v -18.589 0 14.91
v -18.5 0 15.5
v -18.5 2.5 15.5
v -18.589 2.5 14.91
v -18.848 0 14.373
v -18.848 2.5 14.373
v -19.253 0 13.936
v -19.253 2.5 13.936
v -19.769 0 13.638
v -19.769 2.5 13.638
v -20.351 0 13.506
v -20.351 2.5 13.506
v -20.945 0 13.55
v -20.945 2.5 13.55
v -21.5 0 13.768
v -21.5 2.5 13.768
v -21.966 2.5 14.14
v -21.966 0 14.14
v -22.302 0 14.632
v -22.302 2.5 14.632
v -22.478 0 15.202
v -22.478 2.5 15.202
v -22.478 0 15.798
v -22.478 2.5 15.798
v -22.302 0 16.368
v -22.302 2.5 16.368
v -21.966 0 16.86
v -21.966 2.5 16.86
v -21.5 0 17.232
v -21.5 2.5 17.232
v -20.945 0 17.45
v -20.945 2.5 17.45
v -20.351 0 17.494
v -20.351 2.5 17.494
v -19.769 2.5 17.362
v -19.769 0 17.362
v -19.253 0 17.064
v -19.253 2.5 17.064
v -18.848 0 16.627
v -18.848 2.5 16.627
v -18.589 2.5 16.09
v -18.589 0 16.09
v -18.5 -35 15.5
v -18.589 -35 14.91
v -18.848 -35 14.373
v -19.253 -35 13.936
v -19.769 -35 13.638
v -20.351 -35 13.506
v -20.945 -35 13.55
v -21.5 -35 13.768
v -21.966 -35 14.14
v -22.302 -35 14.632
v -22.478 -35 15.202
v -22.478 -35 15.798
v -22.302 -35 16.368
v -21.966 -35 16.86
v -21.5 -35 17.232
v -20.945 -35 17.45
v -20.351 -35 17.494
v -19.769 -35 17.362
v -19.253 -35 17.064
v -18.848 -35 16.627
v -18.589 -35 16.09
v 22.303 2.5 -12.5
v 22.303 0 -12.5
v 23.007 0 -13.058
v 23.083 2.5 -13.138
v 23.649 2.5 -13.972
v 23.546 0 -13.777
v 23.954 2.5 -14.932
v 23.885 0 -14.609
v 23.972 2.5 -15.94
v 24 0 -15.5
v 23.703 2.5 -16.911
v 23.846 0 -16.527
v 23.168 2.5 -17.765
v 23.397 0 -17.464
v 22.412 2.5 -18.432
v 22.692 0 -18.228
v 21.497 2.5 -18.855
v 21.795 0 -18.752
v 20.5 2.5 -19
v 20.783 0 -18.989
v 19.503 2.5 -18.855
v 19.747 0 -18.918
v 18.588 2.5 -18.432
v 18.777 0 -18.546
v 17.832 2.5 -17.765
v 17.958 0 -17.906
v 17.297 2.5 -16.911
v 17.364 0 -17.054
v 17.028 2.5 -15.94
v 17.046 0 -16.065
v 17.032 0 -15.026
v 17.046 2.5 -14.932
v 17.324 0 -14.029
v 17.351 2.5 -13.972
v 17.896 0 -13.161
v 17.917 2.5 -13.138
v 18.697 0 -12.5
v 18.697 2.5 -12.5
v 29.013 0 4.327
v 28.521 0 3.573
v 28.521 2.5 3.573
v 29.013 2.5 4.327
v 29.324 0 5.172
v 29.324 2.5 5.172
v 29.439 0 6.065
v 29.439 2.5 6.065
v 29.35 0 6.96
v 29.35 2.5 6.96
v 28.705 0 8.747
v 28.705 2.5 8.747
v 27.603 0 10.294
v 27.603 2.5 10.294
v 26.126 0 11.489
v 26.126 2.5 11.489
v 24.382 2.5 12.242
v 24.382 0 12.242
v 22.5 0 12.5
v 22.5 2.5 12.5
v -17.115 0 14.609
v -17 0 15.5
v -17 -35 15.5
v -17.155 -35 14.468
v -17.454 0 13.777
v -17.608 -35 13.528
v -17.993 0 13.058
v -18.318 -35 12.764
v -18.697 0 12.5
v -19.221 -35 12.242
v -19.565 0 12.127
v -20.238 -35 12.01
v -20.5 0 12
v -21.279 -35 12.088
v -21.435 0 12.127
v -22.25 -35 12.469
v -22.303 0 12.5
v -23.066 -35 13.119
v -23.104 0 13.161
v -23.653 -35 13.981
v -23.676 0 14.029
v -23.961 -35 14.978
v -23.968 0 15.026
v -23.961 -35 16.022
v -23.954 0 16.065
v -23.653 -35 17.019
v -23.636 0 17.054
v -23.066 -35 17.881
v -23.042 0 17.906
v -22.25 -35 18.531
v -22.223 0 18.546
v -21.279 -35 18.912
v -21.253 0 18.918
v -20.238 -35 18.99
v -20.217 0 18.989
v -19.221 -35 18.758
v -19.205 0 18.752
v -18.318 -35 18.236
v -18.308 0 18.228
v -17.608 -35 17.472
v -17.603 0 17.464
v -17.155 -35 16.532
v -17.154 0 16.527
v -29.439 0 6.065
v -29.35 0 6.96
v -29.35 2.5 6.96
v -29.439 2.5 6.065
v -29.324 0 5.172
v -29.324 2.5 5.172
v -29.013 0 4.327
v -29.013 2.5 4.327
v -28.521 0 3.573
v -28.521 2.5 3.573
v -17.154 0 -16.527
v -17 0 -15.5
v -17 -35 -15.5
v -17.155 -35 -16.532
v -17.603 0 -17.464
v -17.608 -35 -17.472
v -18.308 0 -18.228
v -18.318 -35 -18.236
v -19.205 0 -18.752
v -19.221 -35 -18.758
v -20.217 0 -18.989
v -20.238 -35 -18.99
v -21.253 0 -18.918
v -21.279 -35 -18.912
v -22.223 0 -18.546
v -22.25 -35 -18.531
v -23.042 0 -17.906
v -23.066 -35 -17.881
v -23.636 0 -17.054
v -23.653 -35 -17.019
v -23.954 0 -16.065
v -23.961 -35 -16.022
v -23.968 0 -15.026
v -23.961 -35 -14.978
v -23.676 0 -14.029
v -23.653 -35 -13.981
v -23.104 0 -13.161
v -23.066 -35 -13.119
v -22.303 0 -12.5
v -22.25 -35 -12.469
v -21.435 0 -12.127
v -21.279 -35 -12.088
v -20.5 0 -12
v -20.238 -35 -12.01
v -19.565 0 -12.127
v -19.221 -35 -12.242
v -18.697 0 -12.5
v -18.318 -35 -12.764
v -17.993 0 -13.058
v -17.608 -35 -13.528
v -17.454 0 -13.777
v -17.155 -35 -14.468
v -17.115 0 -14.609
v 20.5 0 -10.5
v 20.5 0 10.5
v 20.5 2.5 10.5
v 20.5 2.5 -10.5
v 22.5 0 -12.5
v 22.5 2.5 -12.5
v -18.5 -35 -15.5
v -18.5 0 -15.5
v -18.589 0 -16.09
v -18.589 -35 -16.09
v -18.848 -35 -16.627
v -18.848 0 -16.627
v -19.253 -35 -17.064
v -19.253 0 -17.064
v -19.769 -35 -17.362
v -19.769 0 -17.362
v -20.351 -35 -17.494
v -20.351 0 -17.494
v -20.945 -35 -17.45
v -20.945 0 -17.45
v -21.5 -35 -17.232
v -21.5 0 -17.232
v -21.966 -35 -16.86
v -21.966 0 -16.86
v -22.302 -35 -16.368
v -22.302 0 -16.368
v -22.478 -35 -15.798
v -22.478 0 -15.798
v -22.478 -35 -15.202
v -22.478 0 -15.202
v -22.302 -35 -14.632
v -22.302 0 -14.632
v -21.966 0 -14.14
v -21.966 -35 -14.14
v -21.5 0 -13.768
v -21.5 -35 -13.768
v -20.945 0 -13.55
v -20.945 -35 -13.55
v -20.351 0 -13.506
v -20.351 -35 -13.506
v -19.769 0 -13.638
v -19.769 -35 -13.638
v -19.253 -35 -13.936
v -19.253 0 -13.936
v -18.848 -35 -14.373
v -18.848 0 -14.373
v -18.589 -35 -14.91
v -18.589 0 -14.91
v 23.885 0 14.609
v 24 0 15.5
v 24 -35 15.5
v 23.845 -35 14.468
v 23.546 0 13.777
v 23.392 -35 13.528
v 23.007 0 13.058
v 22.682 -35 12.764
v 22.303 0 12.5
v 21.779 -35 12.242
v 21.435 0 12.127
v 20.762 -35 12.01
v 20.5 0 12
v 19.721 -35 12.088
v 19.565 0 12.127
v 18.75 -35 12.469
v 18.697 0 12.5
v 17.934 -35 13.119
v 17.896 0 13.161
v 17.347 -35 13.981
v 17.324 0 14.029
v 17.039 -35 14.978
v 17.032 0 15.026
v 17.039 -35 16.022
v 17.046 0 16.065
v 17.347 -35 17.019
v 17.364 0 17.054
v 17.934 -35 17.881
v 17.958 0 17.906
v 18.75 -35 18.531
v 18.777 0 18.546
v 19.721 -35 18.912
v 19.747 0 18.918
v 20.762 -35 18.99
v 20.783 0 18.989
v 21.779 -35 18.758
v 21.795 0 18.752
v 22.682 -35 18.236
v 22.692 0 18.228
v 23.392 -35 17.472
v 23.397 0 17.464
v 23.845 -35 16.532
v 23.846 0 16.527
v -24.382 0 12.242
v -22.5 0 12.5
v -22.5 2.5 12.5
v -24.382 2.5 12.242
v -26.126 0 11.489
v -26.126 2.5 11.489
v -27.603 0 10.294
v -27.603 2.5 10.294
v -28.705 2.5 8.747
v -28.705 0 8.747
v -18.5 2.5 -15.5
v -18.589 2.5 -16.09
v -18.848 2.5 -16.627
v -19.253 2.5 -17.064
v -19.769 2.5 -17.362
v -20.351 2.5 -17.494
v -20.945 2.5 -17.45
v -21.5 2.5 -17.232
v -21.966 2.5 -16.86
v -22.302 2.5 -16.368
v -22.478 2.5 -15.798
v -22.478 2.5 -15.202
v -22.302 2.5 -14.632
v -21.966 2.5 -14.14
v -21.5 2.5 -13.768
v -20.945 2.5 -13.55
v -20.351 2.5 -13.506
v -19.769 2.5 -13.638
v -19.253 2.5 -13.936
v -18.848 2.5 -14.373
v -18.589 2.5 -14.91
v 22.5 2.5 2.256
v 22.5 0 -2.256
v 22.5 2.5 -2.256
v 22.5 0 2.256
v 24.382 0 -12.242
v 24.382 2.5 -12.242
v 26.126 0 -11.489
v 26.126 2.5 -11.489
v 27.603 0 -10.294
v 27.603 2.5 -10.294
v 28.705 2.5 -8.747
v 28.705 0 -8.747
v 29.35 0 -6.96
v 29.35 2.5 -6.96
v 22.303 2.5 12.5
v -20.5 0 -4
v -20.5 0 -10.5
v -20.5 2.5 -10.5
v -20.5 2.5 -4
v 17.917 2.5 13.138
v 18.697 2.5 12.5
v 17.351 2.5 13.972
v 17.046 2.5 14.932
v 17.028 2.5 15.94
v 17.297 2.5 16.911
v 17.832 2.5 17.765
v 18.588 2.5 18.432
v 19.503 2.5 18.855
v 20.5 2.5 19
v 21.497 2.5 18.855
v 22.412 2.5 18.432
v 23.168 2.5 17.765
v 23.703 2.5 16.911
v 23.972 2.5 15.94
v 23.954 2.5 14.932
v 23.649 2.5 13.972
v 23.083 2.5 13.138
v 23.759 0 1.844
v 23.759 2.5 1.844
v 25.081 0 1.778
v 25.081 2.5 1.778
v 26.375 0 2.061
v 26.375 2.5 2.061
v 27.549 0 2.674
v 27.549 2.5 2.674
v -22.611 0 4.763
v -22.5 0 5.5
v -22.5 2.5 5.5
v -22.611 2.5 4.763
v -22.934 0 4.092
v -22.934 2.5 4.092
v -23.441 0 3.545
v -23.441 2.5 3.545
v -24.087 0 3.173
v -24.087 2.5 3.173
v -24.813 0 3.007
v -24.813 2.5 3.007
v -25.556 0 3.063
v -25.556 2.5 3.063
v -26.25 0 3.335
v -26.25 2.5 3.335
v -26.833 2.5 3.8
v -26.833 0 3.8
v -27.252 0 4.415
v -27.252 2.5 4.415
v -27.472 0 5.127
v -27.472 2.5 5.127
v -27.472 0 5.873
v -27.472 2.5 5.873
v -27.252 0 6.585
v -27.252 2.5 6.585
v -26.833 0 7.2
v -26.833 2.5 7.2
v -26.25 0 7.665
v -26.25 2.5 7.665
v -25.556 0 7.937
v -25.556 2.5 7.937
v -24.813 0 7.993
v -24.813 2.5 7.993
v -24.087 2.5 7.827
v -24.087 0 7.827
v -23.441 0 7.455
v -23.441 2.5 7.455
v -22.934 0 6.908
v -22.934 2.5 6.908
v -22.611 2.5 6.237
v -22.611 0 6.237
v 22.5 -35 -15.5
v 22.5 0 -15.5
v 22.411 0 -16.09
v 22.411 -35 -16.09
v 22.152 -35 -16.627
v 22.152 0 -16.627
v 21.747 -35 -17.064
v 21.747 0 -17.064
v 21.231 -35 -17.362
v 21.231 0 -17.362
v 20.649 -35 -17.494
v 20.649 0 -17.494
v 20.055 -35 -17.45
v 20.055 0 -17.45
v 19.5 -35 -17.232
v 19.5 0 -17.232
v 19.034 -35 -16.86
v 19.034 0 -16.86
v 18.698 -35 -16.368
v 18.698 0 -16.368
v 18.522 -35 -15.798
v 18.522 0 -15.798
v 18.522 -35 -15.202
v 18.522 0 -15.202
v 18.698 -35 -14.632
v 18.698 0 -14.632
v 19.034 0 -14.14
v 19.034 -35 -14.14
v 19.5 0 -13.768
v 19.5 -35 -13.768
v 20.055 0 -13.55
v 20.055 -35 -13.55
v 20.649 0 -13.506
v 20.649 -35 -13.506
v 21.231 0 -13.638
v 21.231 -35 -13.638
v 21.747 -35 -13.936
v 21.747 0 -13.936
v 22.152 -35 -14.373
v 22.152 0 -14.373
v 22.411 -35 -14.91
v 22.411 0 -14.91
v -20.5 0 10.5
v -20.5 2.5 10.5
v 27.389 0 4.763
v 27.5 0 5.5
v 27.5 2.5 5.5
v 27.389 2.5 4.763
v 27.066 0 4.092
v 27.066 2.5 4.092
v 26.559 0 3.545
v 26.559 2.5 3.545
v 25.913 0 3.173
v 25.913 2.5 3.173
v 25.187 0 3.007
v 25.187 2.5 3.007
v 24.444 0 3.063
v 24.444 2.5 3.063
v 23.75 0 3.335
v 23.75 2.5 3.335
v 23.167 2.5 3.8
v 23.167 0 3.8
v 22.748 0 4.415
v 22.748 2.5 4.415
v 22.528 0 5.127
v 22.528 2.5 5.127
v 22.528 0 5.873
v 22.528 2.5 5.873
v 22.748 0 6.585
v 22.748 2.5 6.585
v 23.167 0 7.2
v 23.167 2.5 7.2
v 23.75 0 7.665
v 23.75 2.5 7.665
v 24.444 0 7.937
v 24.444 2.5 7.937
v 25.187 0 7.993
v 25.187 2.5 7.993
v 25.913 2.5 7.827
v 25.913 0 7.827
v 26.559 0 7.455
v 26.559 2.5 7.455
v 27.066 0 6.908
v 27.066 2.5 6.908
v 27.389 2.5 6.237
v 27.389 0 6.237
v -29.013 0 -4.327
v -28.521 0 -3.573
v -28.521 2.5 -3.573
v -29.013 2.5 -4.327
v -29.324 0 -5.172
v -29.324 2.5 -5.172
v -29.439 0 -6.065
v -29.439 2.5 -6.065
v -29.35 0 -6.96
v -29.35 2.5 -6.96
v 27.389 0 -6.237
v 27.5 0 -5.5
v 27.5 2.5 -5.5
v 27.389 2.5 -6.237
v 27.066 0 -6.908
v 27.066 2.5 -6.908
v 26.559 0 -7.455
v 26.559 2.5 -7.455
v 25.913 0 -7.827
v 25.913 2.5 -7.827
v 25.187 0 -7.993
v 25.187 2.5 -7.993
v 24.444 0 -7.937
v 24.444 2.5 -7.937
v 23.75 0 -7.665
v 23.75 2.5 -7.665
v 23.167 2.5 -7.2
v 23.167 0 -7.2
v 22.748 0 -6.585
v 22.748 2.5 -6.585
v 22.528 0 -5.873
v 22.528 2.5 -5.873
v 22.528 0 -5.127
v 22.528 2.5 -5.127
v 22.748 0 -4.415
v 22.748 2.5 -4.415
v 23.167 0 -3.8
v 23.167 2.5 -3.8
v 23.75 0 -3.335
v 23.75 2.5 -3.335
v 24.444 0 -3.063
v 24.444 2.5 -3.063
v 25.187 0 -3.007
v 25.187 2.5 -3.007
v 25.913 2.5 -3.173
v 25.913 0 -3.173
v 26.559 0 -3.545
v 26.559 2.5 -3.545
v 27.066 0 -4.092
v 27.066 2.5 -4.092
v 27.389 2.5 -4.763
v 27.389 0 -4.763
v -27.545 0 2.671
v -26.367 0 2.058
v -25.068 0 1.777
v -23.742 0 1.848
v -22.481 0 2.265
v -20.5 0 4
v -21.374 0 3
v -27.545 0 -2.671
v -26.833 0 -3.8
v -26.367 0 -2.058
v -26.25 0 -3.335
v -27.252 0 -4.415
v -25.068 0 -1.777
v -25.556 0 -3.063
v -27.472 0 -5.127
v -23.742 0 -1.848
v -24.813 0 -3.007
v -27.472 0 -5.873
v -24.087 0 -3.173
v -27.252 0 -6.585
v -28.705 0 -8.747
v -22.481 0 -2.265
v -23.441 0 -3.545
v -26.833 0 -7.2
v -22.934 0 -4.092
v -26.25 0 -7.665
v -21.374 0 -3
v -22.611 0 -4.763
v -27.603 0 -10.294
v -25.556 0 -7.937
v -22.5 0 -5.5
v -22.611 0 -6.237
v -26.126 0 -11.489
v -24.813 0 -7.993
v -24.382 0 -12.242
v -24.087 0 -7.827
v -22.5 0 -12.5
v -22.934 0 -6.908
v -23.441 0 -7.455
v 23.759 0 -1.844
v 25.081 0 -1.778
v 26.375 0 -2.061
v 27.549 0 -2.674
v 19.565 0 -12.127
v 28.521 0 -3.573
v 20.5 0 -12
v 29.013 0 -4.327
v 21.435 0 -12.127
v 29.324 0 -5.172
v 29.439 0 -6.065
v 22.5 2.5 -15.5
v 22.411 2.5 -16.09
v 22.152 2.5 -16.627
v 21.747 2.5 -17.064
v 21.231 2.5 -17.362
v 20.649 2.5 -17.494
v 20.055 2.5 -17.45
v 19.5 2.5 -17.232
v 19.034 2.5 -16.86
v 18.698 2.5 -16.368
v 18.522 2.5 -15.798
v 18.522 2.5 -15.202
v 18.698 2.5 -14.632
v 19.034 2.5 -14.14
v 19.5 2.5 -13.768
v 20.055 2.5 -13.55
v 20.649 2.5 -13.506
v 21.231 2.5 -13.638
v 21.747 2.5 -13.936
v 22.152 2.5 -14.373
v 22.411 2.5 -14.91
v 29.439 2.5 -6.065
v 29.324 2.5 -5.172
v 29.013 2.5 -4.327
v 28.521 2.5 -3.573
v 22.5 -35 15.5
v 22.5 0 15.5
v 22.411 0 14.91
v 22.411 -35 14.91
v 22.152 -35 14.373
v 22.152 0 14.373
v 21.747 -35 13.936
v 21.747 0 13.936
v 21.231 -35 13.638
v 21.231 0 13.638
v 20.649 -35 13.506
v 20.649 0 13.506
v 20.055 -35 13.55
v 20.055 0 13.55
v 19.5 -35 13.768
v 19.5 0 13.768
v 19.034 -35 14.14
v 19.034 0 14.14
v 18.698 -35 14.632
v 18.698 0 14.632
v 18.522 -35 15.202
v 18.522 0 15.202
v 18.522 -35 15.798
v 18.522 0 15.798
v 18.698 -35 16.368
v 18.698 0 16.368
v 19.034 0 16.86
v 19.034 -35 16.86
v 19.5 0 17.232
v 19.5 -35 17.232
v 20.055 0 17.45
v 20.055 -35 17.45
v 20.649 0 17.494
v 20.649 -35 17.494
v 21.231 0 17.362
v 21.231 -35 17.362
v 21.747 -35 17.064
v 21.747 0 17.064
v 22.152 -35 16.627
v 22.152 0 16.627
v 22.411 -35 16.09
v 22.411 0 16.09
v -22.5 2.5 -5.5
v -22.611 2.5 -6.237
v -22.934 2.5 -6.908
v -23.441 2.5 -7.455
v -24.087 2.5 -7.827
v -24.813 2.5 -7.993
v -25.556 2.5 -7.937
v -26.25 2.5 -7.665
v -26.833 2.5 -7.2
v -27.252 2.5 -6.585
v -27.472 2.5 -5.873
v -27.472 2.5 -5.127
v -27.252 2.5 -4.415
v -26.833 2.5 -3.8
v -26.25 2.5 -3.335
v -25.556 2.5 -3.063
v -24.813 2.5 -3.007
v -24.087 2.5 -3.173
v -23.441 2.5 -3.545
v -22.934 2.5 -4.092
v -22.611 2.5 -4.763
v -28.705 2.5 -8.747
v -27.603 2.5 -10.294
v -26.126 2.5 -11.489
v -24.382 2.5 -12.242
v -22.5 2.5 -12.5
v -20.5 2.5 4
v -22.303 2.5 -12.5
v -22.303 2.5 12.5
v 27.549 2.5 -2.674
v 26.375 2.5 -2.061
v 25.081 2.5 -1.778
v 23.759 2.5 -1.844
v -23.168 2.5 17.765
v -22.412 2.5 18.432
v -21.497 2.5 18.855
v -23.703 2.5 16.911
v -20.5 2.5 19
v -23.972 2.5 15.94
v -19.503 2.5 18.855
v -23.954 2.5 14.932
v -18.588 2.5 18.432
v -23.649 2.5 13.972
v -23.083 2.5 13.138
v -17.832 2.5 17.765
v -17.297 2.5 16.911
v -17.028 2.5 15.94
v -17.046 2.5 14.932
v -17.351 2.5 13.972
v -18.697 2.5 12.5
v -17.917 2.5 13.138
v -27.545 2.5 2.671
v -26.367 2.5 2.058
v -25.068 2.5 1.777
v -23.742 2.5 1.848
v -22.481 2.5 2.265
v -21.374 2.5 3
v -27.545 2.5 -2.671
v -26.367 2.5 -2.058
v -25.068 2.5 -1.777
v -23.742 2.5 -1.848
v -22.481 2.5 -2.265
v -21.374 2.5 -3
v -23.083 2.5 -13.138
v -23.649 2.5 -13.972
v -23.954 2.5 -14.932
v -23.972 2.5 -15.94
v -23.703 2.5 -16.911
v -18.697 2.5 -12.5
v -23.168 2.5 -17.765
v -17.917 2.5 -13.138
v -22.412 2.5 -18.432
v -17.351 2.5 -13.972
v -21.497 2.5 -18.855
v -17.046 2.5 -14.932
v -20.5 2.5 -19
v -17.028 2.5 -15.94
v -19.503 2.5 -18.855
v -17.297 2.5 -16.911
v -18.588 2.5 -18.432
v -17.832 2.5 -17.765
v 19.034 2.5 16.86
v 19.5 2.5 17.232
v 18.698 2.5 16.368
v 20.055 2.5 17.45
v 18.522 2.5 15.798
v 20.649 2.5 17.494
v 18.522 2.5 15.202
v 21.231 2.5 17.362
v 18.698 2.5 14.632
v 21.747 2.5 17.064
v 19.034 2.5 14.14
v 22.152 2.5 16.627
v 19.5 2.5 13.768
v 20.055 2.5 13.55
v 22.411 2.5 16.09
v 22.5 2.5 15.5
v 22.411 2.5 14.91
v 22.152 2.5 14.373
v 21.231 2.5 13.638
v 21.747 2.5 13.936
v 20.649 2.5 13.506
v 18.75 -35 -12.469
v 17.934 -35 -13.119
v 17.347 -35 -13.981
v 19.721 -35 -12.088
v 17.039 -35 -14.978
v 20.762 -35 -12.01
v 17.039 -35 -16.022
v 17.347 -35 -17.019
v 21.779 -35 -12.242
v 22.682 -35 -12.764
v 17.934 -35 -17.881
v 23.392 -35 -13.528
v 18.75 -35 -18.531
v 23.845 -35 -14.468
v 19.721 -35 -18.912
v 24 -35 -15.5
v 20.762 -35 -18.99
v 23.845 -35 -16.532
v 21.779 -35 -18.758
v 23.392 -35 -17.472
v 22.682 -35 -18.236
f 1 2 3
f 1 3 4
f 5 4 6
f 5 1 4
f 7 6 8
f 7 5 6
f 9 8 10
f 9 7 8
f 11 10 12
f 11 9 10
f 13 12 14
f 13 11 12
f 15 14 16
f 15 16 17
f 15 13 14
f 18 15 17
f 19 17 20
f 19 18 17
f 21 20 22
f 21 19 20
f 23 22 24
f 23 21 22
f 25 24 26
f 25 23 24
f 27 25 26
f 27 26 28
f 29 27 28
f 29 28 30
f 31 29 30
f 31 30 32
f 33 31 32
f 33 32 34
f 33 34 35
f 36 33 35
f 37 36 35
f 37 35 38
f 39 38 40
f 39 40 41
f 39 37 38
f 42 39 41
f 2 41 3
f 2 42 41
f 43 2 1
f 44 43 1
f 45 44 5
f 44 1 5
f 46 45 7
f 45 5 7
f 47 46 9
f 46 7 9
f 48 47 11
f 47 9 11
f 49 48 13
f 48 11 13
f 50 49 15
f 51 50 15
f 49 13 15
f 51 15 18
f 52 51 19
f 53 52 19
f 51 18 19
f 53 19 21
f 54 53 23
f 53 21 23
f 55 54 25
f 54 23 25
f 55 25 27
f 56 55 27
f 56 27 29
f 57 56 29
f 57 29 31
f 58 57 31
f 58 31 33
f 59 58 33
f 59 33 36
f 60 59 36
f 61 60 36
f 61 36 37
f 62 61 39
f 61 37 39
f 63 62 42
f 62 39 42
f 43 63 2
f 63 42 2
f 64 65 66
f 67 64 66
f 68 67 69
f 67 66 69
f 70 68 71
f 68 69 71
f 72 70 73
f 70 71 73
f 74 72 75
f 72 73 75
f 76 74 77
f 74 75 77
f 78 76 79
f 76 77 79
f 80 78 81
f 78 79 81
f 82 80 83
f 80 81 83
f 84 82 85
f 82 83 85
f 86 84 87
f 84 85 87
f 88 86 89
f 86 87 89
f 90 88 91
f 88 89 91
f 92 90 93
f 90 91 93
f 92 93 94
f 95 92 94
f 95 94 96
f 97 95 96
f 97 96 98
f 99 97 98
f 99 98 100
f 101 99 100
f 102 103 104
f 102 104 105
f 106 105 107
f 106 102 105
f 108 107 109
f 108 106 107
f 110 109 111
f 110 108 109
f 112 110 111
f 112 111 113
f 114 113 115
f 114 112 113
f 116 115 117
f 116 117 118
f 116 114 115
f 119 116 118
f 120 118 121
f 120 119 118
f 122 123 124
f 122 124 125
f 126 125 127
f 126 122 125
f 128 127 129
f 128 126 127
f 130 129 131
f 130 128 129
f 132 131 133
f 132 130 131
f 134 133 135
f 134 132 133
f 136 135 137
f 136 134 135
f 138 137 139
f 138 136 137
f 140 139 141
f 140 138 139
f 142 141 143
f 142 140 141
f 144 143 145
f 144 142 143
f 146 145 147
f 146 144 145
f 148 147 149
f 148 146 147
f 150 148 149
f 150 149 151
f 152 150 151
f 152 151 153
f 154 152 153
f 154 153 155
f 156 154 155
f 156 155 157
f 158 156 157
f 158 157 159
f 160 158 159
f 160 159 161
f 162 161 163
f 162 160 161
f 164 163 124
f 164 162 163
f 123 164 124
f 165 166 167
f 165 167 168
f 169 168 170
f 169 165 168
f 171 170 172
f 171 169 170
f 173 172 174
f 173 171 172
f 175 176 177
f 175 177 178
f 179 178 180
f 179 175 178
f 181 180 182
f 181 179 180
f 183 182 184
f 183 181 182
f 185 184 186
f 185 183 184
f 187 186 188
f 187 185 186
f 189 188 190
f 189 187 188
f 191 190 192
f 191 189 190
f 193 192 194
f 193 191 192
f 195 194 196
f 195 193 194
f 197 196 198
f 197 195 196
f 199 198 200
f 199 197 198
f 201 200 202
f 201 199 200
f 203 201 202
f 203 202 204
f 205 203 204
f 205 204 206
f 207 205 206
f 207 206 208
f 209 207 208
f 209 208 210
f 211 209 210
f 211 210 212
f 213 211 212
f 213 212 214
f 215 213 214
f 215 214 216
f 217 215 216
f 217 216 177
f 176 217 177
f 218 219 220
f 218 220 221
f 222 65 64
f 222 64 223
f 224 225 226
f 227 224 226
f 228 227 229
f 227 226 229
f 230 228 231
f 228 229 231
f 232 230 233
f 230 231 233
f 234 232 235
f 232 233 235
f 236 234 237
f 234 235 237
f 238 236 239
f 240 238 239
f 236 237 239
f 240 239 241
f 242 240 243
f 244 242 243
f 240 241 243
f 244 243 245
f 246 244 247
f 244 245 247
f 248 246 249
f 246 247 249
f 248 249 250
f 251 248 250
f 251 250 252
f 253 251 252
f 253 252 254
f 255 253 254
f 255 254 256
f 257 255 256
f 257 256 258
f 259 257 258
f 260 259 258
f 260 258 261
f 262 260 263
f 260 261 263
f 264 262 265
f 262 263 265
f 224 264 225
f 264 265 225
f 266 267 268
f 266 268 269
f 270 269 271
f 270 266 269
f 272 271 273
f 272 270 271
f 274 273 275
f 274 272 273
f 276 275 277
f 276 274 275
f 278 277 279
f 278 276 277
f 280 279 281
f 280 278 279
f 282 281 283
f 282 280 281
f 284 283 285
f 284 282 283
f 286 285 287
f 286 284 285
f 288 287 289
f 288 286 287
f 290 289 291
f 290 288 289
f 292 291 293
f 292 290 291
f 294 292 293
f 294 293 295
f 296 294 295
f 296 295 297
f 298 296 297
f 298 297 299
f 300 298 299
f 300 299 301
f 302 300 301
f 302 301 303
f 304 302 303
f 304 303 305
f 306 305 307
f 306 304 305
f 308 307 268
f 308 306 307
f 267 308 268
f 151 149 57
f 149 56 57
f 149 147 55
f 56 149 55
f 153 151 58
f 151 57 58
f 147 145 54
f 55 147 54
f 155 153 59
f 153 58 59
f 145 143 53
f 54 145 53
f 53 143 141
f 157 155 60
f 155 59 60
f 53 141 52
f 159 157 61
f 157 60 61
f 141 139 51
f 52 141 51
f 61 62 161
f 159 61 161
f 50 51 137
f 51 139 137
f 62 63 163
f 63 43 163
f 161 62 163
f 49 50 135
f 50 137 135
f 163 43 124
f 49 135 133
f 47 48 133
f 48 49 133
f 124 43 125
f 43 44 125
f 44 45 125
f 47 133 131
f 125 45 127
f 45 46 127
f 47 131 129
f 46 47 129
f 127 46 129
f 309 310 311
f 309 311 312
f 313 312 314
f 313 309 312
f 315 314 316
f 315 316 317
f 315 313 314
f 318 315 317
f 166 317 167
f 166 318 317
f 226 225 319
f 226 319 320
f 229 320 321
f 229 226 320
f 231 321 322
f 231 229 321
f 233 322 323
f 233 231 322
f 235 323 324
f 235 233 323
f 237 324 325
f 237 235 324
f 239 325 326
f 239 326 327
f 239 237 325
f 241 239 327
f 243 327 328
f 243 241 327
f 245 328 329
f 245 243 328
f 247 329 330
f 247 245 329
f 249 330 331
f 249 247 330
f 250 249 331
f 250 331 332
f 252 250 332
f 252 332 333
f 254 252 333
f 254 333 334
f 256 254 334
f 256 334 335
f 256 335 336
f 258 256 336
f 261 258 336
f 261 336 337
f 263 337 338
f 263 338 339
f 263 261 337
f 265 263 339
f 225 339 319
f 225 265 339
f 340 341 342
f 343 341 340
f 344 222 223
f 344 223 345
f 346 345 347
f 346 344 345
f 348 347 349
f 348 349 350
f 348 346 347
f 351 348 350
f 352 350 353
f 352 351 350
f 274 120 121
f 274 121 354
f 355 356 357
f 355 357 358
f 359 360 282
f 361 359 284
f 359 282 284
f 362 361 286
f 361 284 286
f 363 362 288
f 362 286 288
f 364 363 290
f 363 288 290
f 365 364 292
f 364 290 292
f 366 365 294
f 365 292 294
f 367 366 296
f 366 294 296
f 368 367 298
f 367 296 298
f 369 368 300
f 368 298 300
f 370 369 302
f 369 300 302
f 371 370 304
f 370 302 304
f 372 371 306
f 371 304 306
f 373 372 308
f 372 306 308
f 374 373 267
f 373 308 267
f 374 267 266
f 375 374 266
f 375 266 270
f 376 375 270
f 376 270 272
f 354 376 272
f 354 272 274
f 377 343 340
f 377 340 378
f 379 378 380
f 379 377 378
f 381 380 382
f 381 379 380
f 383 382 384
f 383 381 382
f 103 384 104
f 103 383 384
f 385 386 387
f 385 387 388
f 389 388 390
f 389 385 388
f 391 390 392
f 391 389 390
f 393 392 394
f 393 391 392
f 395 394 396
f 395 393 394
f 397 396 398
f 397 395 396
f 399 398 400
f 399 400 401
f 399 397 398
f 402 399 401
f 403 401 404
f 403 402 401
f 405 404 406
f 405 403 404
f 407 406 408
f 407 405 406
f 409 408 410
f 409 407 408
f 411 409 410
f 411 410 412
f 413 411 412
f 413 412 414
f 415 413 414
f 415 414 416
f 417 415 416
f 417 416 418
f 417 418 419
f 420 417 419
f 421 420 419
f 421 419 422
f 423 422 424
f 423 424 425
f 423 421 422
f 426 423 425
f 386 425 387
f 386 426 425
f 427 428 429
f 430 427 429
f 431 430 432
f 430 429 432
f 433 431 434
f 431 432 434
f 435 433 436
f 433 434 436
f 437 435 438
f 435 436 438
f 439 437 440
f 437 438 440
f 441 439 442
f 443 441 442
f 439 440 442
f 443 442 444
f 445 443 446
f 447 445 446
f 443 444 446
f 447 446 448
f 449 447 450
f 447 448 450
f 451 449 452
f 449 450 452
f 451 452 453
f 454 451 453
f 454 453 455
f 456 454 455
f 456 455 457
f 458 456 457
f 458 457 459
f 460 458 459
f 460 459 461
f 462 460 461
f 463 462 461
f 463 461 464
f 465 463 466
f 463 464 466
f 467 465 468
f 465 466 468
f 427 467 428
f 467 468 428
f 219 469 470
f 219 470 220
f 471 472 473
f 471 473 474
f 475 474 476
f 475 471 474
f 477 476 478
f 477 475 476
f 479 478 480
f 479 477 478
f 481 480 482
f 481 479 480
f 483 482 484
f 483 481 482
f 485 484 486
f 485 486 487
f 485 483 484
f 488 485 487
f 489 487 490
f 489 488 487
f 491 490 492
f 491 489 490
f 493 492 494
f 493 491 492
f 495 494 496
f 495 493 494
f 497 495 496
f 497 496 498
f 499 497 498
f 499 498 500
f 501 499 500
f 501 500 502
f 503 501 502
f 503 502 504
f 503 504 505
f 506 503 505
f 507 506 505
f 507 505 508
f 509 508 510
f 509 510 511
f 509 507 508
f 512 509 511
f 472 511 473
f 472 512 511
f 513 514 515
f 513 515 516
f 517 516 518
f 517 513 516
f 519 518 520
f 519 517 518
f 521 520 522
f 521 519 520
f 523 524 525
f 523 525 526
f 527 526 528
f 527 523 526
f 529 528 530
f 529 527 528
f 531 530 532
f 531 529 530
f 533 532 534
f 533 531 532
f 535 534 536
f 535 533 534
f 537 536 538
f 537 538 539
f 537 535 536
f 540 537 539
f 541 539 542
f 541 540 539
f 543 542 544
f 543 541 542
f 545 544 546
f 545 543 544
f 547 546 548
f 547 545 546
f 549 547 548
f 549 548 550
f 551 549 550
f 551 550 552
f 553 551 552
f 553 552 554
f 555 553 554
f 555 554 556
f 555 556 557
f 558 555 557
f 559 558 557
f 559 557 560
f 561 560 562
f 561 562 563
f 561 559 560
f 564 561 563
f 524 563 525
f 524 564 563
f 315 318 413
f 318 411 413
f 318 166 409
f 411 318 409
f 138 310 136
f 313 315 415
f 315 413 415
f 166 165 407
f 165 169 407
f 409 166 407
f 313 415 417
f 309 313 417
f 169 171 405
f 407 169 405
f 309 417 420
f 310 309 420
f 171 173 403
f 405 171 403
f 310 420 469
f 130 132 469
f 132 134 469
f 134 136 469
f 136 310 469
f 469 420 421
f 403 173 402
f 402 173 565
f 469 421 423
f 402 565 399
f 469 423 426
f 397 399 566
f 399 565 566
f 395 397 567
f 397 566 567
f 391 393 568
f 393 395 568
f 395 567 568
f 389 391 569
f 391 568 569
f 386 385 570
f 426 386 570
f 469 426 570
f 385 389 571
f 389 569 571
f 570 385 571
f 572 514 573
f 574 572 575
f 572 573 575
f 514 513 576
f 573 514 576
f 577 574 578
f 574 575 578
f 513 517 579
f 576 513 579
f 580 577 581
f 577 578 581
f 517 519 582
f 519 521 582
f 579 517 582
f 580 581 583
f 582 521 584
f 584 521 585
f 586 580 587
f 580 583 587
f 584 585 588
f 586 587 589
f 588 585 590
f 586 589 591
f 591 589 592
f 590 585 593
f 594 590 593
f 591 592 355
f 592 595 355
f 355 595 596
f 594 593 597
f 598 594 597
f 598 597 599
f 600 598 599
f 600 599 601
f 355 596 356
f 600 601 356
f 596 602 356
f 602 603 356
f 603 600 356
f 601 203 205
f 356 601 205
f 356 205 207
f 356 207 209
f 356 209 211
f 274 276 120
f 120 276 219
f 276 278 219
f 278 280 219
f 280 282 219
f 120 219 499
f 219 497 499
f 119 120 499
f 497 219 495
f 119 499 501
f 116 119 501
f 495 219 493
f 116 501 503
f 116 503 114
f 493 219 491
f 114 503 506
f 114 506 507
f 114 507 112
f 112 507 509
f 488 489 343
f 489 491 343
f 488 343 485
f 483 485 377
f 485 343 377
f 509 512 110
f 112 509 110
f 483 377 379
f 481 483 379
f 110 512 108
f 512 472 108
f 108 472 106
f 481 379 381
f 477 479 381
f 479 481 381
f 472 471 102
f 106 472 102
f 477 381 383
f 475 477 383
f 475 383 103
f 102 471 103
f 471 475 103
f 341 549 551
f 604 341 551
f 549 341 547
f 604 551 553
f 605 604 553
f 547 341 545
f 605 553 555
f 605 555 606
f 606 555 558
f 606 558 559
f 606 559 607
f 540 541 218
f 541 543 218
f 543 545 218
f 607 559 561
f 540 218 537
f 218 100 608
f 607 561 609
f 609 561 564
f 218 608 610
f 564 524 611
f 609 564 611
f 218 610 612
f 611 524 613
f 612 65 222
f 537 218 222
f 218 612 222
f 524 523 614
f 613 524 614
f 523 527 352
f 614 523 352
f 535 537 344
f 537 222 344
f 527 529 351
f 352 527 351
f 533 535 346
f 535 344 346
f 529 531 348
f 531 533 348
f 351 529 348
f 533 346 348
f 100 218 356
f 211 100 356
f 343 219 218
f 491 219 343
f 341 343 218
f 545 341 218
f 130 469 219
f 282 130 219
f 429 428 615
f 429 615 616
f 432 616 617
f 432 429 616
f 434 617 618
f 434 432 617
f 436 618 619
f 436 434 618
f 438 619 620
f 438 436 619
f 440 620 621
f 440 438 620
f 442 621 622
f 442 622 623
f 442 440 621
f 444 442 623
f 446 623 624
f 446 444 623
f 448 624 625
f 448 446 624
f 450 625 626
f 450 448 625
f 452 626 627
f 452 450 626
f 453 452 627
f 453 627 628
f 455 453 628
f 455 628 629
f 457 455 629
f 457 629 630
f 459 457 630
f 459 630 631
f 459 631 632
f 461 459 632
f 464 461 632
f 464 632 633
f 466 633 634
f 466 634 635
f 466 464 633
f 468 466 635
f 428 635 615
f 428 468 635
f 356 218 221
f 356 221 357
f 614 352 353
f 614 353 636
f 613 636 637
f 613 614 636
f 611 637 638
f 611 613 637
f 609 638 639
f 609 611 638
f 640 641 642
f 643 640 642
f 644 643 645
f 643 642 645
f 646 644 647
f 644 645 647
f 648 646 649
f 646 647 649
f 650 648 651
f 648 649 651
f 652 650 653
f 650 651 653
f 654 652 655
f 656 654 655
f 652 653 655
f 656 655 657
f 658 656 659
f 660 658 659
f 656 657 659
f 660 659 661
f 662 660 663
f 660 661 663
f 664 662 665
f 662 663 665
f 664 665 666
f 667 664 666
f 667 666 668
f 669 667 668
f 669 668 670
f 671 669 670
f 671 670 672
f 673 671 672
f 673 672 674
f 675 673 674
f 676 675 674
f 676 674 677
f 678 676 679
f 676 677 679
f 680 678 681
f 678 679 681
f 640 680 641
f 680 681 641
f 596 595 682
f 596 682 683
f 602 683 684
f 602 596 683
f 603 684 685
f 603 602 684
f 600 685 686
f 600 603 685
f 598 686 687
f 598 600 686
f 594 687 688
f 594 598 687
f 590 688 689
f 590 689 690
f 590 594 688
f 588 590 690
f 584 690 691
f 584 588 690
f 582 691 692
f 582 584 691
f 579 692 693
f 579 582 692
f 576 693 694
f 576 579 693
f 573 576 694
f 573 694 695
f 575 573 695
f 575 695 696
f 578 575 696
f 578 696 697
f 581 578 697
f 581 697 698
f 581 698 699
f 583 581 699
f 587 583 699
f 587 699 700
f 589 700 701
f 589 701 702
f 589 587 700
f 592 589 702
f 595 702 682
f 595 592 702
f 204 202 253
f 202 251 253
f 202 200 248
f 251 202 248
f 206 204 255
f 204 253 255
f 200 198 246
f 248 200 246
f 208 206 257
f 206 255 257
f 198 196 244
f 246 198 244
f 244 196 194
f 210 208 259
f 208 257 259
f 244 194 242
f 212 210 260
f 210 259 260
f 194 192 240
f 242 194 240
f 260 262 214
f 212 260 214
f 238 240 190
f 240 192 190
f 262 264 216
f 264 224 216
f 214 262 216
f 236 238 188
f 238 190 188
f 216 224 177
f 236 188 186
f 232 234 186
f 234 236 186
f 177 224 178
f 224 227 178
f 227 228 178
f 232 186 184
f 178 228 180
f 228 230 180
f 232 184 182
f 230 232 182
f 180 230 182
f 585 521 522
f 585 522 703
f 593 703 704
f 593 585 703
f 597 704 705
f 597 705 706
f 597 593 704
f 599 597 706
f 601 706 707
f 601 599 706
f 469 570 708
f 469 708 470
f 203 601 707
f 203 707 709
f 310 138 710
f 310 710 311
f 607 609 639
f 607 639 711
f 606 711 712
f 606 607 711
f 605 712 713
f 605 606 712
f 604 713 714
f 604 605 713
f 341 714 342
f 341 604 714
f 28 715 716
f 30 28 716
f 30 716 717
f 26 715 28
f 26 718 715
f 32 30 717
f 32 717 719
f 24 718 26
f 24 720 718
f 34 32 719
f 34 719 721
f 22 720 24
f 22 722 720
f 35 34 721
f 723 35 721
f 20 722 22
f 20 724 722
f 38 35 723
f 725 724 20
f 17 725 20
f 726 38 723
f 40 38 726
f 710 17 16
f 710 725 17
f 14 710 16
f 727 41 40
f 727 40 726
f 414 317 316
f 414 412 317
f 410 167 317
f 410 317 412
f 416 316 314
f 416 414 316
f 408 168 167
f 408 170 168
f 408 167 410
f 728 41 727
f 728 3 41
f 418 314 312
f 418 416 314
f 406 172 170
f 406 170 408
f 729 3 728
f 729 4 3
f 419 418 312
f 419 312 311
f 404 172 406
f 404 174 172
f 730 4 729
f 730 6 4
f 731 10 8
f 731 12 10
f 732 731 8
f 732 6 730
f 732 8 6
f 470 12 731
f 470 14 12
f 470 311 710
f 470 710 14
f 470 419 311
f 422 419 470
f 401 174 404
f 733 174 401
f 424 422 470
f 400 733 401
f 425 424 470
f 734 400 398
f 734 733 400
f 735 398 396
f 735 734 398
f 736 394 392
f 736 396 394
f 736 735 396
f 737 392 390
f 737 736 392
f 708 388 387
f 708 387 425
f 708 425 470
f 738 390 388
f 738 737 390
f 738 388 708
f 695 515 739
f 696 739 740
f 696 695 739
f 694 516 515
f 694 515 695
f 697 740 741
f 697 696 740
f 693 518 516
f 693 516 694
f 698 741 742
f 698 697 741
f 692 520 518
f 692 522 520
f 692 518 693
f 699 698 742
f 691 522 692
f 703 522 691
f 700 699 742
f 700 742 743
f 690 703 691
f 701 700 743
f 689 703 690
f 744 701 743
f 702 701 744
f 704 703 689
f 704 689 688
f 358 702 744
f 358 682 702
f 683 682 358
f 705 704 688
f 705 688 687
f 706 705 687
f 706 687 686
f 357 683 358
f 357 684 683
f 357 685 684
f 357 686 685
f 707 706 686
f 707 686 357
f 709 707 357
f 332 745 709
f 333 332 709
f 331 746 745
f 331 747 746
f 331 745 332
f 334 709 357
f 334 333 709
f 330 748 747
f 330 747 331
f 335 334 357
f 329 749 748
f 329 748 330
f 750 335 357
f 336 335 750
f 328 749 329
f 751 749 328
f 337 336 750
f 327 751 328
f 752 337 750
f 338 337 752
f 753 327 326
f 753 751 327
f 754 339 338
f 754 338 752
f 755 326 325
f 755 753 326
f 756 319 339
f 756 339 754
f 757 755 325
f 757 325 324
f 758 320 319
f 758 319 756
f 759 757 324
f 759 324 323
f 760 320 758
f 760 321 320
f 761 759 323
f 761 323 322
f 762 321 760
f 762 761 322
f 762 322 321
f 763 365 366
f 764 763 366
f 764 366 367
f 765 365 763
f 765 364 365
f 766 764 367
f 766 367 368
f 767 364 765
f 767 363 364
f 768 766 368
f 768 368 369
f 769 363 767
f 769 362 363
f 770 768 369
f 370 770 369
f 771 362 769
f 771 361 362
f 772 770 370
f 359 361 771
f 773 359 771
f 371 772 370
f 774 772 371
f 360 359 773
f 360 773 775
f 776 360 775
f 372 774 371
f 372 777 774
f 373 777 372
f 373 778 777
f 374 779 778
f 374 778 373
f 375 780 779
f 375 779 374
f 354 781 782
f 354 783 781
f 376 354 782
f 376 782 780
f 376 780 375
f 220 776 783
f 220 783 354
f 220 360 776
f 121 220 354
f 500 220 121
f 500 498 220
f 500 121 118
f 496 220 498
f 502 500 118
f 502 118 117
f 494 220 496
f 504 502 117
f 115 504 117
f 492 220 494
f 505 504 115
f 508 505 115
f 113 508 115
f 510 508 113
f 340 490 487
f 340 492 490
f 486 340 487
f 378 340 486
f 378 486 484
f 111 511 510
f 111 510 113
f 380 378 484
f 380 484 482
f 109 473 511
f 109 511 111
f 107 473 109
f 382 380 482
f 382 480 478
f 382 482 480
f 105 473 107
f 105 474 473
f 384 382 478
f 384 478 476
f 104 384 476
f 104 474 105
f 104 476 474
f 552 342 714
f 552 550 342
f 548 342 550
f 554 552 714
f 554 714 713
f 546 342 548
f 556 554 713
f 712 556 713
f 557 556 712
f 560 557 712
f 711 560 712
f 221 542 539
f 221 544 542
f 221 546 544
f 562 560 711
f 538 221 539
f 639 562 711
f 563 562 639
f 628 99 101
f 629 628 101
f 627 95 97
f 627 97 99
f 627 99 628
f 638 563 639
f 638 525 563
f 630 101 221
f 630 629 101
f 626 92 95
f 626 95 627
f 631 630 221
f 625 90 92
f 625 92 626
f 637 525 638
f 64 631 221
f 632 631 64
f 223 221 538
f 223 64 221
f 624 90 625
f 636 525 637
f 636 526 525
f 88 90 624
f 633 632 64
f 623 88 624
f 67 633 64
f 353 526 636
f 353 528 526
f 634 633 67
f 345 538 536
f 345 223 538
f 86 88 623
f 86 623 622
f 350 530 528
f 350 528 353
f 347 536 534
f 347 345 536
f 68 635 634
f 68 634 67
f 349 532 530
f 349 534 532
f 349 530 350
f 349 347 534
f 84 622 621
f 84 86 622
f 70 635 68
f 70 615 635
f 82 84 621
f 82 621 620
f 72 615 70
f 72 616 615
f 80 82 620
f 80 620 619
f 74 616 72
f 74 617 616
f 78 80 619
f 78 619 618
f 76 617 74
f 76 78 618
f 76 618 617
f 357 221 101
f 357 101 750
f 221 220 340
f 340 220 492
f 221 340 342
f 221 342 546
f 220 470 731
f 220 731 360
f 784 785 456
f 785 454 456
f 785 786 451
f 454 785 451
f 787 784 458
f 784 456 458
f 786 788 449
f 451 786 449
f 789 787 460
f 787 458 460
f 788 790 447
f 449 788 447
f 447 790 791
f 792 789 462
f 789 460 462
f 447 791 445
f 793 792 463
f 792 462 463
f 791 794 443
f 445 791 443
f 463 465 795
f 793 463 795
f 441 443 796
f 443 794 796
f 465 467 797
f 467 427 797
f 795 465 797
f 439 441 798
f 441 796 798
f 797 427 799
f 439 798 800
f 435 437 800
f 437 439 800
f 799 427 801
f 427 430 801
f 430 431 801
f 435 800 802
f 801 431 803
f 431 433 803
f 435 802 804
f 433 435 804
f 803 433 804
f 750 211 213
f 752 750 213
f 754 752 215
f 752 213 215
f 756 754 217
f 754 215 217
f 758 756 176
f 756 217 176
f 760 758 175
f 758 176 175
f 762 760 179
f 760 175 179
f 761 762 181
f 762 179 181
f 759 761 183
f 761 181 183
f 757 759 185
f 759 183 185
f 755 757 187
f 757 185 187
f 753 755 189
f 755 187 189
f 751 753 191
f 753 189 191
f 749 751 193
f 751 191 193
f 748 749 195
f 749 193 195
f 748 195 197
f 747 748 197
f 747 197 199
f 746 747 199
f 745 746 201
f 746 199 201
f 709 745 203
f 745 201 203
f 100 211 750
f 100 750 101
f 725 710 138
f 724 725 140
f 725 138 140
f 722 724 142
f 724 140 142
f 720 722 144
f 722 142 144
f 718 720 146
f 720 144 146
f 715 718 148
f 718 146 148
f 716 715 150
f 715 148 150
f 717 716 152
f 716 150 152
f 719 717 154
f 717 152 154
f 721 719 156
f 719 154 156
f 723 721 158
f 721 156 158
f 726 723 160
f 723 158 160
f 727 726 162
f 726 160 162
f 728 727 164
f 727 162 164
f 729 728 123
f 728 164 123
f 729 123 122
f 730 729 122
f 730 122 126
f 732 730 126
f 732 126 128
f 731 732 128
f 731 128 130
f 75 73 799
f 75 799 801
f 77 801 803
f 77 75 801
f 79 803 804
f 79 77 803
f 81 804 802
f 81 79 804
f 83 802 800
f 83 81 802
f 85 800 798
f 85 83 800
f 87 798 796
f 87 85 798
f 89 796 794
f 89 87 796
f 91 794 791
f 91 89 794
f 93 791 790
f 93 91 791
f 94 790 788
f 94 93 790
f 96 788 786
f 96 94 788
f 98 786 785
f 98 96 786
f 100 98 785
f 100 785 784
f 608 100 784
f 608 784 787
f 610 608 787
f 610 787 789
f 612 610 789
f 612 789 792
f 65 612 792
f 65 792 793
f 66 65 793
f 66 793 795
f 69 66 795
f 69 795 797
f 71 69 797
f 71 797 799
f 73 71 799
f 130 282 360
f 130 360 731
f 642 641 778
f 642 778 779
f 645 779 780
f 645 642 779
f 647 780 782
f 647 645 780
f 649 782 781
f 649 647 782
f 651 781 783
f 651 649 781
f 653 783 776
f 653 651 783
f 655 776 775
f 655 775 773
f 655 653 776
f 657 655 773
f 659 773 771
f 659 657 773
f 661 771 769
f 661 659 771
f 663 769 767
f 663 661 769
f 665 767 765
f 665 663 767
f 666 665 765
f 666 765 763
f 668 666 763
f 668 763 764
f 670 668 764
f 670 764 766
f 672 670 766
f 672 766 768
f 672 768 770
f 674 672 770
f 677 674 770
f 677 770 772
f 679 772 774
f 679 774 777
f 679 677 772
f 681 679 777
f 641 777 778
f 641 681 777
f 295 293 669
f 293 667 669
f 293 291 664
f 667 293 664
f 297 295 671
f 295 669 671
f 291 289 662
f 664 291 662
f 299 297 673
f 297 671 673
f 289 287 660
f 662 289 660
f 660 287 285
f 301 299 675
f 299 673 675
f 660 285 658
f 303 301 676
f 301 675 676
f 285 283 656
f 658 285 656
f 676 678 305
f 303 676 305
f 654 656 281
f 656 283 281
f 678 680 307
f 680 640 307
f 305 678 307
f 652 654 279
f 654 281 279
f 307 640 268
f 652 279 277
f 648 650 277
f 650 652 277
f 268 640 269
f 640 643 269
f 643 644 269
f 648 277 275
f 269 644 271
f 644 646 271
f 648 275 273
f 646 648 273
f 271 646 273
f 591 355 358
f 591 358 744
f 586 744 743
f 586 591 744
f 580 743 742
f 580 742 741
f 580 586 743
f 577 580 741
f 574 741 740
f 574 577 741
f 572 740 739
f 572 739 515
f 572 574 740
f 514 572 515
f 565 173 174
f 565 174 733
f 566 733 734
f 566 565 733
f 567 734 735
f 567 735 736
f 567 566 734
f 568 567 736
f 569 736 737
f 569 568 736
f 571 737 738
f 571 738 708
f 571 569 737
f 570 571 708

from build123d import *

# Parameters (mm, degrees)
SKETCH1_R                = 2.5
BOSS_EXTRUDE1_DEPTH      = 2.5
SKETCH4_R                = 3.5
SKETCH4_R_2              = 2
BOSS_EXTRUDE2_DEPTH      = 2.5
BOSS_EXTRUDE2_DEPTH_BACK = 35


with BuildPart() as part:
    # Sketch1 → Boss-Extrude1 (new body)
    with BuildSketch(Plane(origin=(0, 0, 0), x_dir=(1, 0, 0), z_dir=(0, 1, 0))):
        with BuildLine():
            Line((20.5, 10.5), (-20.5, 10.5))
            Line((-20.5, 10.5), (-20.5, 4))
            ThreePointArc((-20.5, 4), (-24.40287122, 1.76806345), (-28.520566145, 3.573204173))
            ThreePointArc((-28.520566145, 3.573204173), (-29.324072849, 5.171652721), (-29.350396575, 6.960498116))
            ThreePointArc((-29.350396575, 6.960498116), (-26.904940816, 10.941842627), (-22.5, 12.5))
            Line((-22.5, 12.5), (22.5, 12.5))
            ThreePointArc((22.5, 12.5), (26.904940816, 10.941842627), (29.350396575, 6.960498116))
            ThreePointArc((29.350396575, 6.960498116), (29.324072849, 5.171652721), (28.520566145, 3.573204173))
            ThreePointArc((28.520566145, 3.573204173), (25.737402548, 1.876578025), (22.5, 2.2557411))
            Line((22.5, 2.2557411), (22.5, -2.2557411))
            ThreePointArc((22.5, -2.2557411), (25.737402548, -1.876578025), (28.520566145, -3.573204173))
            ThreePointArc((28.520566145, -3.573204173), (29.324072849, -5.171652721), (29.350396575, -6.960498116))
            ThreePointArc((29.350396575, -6.960498116), (26.904940816, -10.941842627), (22.5, -12.5))
            Line((22.5, -12.5), (-22.5, -12.5))
            ThreePointArc((-22.5, -12.5), (-26.904940816, -10.941842627), (-29.350396575, -6.960498116))
            ThreePointArc((-29.350396575, -6.960498116), (-29.324072849, -5.171652721), (-28.520566145, -3.573204173))
            ThreePointArc((-28.520566145, -3.573204173), (-24.40287122, -1.76806345), (-20.5, -4))
            Line((-20.5, -4), (-20.5, -10.5))
            Line((-20.5, -10.5), (20.5, -10.5))
            Line((20.5, -10.5), (20.5, 10.5))
        make_face()
        with Locations((-25, 5.5)):
            Circle(SKETCH1_R, mode=Mode.SUBTRACT)
        with Locations((-25, -5.5)):
            Circle(SKETCH1_R, mode=Mode.SUBTRACT)
        with Locations((25, -5.5)):
            Circle(SKETCH1_R, mode=Mode.SUBTRACT)
        with Locations((25, 5.5)):
            Circle(SKETCH1_R, mode=Mode.SUBTRACT)
    extrude(amount=BOSS_EXTRUDE1_DEPTH)

    # Sketch4 → Boss-Extrude2 (add, two sides)
    with BuildSketch(Plane(origin=(0, 0, 0), x_dir=(1, 0, 0), z_dir=(0, 1, 0))) as boss_extrude2_sk:
        with Locations((-20.5, 15.5)):
            Circle(SKETCH4_R)
        with Locations((-20.5, 15.5)):
            Circle(SKETCH4_R_2, mode=Mode.SUBTRACT)
        with Locations((20.5, 15.5)):
            Circle(SKETCH4_R)
        with Locations((20.5, 15.5)):
            Circle(SKETCH4_R_2, mode=Mode.SUBTRACT)
        with Locations((-20.5, -15.5)):
            Circle(SKETCH4_R)
        with Locations((-20.5, -15.5)):
            Circle(SKETCH4_R_2, mode=Mode.SUBTRACT)
        with Locations((20.5, -15.5)):
            Circle(SKETCH4_R)
        with Locations((20.5, -15.5)):
            Circle(SKETCH4_R_2, mode=Mode.SUBTRACT)
    extrude(amount=BOSS_EXTRUDE2_DEPTH)
    extrude(boss_extrude2_sk.sketch, amount=-BOSS_EXTRUDE2_DEPTH_BACK)


solid = part.part
